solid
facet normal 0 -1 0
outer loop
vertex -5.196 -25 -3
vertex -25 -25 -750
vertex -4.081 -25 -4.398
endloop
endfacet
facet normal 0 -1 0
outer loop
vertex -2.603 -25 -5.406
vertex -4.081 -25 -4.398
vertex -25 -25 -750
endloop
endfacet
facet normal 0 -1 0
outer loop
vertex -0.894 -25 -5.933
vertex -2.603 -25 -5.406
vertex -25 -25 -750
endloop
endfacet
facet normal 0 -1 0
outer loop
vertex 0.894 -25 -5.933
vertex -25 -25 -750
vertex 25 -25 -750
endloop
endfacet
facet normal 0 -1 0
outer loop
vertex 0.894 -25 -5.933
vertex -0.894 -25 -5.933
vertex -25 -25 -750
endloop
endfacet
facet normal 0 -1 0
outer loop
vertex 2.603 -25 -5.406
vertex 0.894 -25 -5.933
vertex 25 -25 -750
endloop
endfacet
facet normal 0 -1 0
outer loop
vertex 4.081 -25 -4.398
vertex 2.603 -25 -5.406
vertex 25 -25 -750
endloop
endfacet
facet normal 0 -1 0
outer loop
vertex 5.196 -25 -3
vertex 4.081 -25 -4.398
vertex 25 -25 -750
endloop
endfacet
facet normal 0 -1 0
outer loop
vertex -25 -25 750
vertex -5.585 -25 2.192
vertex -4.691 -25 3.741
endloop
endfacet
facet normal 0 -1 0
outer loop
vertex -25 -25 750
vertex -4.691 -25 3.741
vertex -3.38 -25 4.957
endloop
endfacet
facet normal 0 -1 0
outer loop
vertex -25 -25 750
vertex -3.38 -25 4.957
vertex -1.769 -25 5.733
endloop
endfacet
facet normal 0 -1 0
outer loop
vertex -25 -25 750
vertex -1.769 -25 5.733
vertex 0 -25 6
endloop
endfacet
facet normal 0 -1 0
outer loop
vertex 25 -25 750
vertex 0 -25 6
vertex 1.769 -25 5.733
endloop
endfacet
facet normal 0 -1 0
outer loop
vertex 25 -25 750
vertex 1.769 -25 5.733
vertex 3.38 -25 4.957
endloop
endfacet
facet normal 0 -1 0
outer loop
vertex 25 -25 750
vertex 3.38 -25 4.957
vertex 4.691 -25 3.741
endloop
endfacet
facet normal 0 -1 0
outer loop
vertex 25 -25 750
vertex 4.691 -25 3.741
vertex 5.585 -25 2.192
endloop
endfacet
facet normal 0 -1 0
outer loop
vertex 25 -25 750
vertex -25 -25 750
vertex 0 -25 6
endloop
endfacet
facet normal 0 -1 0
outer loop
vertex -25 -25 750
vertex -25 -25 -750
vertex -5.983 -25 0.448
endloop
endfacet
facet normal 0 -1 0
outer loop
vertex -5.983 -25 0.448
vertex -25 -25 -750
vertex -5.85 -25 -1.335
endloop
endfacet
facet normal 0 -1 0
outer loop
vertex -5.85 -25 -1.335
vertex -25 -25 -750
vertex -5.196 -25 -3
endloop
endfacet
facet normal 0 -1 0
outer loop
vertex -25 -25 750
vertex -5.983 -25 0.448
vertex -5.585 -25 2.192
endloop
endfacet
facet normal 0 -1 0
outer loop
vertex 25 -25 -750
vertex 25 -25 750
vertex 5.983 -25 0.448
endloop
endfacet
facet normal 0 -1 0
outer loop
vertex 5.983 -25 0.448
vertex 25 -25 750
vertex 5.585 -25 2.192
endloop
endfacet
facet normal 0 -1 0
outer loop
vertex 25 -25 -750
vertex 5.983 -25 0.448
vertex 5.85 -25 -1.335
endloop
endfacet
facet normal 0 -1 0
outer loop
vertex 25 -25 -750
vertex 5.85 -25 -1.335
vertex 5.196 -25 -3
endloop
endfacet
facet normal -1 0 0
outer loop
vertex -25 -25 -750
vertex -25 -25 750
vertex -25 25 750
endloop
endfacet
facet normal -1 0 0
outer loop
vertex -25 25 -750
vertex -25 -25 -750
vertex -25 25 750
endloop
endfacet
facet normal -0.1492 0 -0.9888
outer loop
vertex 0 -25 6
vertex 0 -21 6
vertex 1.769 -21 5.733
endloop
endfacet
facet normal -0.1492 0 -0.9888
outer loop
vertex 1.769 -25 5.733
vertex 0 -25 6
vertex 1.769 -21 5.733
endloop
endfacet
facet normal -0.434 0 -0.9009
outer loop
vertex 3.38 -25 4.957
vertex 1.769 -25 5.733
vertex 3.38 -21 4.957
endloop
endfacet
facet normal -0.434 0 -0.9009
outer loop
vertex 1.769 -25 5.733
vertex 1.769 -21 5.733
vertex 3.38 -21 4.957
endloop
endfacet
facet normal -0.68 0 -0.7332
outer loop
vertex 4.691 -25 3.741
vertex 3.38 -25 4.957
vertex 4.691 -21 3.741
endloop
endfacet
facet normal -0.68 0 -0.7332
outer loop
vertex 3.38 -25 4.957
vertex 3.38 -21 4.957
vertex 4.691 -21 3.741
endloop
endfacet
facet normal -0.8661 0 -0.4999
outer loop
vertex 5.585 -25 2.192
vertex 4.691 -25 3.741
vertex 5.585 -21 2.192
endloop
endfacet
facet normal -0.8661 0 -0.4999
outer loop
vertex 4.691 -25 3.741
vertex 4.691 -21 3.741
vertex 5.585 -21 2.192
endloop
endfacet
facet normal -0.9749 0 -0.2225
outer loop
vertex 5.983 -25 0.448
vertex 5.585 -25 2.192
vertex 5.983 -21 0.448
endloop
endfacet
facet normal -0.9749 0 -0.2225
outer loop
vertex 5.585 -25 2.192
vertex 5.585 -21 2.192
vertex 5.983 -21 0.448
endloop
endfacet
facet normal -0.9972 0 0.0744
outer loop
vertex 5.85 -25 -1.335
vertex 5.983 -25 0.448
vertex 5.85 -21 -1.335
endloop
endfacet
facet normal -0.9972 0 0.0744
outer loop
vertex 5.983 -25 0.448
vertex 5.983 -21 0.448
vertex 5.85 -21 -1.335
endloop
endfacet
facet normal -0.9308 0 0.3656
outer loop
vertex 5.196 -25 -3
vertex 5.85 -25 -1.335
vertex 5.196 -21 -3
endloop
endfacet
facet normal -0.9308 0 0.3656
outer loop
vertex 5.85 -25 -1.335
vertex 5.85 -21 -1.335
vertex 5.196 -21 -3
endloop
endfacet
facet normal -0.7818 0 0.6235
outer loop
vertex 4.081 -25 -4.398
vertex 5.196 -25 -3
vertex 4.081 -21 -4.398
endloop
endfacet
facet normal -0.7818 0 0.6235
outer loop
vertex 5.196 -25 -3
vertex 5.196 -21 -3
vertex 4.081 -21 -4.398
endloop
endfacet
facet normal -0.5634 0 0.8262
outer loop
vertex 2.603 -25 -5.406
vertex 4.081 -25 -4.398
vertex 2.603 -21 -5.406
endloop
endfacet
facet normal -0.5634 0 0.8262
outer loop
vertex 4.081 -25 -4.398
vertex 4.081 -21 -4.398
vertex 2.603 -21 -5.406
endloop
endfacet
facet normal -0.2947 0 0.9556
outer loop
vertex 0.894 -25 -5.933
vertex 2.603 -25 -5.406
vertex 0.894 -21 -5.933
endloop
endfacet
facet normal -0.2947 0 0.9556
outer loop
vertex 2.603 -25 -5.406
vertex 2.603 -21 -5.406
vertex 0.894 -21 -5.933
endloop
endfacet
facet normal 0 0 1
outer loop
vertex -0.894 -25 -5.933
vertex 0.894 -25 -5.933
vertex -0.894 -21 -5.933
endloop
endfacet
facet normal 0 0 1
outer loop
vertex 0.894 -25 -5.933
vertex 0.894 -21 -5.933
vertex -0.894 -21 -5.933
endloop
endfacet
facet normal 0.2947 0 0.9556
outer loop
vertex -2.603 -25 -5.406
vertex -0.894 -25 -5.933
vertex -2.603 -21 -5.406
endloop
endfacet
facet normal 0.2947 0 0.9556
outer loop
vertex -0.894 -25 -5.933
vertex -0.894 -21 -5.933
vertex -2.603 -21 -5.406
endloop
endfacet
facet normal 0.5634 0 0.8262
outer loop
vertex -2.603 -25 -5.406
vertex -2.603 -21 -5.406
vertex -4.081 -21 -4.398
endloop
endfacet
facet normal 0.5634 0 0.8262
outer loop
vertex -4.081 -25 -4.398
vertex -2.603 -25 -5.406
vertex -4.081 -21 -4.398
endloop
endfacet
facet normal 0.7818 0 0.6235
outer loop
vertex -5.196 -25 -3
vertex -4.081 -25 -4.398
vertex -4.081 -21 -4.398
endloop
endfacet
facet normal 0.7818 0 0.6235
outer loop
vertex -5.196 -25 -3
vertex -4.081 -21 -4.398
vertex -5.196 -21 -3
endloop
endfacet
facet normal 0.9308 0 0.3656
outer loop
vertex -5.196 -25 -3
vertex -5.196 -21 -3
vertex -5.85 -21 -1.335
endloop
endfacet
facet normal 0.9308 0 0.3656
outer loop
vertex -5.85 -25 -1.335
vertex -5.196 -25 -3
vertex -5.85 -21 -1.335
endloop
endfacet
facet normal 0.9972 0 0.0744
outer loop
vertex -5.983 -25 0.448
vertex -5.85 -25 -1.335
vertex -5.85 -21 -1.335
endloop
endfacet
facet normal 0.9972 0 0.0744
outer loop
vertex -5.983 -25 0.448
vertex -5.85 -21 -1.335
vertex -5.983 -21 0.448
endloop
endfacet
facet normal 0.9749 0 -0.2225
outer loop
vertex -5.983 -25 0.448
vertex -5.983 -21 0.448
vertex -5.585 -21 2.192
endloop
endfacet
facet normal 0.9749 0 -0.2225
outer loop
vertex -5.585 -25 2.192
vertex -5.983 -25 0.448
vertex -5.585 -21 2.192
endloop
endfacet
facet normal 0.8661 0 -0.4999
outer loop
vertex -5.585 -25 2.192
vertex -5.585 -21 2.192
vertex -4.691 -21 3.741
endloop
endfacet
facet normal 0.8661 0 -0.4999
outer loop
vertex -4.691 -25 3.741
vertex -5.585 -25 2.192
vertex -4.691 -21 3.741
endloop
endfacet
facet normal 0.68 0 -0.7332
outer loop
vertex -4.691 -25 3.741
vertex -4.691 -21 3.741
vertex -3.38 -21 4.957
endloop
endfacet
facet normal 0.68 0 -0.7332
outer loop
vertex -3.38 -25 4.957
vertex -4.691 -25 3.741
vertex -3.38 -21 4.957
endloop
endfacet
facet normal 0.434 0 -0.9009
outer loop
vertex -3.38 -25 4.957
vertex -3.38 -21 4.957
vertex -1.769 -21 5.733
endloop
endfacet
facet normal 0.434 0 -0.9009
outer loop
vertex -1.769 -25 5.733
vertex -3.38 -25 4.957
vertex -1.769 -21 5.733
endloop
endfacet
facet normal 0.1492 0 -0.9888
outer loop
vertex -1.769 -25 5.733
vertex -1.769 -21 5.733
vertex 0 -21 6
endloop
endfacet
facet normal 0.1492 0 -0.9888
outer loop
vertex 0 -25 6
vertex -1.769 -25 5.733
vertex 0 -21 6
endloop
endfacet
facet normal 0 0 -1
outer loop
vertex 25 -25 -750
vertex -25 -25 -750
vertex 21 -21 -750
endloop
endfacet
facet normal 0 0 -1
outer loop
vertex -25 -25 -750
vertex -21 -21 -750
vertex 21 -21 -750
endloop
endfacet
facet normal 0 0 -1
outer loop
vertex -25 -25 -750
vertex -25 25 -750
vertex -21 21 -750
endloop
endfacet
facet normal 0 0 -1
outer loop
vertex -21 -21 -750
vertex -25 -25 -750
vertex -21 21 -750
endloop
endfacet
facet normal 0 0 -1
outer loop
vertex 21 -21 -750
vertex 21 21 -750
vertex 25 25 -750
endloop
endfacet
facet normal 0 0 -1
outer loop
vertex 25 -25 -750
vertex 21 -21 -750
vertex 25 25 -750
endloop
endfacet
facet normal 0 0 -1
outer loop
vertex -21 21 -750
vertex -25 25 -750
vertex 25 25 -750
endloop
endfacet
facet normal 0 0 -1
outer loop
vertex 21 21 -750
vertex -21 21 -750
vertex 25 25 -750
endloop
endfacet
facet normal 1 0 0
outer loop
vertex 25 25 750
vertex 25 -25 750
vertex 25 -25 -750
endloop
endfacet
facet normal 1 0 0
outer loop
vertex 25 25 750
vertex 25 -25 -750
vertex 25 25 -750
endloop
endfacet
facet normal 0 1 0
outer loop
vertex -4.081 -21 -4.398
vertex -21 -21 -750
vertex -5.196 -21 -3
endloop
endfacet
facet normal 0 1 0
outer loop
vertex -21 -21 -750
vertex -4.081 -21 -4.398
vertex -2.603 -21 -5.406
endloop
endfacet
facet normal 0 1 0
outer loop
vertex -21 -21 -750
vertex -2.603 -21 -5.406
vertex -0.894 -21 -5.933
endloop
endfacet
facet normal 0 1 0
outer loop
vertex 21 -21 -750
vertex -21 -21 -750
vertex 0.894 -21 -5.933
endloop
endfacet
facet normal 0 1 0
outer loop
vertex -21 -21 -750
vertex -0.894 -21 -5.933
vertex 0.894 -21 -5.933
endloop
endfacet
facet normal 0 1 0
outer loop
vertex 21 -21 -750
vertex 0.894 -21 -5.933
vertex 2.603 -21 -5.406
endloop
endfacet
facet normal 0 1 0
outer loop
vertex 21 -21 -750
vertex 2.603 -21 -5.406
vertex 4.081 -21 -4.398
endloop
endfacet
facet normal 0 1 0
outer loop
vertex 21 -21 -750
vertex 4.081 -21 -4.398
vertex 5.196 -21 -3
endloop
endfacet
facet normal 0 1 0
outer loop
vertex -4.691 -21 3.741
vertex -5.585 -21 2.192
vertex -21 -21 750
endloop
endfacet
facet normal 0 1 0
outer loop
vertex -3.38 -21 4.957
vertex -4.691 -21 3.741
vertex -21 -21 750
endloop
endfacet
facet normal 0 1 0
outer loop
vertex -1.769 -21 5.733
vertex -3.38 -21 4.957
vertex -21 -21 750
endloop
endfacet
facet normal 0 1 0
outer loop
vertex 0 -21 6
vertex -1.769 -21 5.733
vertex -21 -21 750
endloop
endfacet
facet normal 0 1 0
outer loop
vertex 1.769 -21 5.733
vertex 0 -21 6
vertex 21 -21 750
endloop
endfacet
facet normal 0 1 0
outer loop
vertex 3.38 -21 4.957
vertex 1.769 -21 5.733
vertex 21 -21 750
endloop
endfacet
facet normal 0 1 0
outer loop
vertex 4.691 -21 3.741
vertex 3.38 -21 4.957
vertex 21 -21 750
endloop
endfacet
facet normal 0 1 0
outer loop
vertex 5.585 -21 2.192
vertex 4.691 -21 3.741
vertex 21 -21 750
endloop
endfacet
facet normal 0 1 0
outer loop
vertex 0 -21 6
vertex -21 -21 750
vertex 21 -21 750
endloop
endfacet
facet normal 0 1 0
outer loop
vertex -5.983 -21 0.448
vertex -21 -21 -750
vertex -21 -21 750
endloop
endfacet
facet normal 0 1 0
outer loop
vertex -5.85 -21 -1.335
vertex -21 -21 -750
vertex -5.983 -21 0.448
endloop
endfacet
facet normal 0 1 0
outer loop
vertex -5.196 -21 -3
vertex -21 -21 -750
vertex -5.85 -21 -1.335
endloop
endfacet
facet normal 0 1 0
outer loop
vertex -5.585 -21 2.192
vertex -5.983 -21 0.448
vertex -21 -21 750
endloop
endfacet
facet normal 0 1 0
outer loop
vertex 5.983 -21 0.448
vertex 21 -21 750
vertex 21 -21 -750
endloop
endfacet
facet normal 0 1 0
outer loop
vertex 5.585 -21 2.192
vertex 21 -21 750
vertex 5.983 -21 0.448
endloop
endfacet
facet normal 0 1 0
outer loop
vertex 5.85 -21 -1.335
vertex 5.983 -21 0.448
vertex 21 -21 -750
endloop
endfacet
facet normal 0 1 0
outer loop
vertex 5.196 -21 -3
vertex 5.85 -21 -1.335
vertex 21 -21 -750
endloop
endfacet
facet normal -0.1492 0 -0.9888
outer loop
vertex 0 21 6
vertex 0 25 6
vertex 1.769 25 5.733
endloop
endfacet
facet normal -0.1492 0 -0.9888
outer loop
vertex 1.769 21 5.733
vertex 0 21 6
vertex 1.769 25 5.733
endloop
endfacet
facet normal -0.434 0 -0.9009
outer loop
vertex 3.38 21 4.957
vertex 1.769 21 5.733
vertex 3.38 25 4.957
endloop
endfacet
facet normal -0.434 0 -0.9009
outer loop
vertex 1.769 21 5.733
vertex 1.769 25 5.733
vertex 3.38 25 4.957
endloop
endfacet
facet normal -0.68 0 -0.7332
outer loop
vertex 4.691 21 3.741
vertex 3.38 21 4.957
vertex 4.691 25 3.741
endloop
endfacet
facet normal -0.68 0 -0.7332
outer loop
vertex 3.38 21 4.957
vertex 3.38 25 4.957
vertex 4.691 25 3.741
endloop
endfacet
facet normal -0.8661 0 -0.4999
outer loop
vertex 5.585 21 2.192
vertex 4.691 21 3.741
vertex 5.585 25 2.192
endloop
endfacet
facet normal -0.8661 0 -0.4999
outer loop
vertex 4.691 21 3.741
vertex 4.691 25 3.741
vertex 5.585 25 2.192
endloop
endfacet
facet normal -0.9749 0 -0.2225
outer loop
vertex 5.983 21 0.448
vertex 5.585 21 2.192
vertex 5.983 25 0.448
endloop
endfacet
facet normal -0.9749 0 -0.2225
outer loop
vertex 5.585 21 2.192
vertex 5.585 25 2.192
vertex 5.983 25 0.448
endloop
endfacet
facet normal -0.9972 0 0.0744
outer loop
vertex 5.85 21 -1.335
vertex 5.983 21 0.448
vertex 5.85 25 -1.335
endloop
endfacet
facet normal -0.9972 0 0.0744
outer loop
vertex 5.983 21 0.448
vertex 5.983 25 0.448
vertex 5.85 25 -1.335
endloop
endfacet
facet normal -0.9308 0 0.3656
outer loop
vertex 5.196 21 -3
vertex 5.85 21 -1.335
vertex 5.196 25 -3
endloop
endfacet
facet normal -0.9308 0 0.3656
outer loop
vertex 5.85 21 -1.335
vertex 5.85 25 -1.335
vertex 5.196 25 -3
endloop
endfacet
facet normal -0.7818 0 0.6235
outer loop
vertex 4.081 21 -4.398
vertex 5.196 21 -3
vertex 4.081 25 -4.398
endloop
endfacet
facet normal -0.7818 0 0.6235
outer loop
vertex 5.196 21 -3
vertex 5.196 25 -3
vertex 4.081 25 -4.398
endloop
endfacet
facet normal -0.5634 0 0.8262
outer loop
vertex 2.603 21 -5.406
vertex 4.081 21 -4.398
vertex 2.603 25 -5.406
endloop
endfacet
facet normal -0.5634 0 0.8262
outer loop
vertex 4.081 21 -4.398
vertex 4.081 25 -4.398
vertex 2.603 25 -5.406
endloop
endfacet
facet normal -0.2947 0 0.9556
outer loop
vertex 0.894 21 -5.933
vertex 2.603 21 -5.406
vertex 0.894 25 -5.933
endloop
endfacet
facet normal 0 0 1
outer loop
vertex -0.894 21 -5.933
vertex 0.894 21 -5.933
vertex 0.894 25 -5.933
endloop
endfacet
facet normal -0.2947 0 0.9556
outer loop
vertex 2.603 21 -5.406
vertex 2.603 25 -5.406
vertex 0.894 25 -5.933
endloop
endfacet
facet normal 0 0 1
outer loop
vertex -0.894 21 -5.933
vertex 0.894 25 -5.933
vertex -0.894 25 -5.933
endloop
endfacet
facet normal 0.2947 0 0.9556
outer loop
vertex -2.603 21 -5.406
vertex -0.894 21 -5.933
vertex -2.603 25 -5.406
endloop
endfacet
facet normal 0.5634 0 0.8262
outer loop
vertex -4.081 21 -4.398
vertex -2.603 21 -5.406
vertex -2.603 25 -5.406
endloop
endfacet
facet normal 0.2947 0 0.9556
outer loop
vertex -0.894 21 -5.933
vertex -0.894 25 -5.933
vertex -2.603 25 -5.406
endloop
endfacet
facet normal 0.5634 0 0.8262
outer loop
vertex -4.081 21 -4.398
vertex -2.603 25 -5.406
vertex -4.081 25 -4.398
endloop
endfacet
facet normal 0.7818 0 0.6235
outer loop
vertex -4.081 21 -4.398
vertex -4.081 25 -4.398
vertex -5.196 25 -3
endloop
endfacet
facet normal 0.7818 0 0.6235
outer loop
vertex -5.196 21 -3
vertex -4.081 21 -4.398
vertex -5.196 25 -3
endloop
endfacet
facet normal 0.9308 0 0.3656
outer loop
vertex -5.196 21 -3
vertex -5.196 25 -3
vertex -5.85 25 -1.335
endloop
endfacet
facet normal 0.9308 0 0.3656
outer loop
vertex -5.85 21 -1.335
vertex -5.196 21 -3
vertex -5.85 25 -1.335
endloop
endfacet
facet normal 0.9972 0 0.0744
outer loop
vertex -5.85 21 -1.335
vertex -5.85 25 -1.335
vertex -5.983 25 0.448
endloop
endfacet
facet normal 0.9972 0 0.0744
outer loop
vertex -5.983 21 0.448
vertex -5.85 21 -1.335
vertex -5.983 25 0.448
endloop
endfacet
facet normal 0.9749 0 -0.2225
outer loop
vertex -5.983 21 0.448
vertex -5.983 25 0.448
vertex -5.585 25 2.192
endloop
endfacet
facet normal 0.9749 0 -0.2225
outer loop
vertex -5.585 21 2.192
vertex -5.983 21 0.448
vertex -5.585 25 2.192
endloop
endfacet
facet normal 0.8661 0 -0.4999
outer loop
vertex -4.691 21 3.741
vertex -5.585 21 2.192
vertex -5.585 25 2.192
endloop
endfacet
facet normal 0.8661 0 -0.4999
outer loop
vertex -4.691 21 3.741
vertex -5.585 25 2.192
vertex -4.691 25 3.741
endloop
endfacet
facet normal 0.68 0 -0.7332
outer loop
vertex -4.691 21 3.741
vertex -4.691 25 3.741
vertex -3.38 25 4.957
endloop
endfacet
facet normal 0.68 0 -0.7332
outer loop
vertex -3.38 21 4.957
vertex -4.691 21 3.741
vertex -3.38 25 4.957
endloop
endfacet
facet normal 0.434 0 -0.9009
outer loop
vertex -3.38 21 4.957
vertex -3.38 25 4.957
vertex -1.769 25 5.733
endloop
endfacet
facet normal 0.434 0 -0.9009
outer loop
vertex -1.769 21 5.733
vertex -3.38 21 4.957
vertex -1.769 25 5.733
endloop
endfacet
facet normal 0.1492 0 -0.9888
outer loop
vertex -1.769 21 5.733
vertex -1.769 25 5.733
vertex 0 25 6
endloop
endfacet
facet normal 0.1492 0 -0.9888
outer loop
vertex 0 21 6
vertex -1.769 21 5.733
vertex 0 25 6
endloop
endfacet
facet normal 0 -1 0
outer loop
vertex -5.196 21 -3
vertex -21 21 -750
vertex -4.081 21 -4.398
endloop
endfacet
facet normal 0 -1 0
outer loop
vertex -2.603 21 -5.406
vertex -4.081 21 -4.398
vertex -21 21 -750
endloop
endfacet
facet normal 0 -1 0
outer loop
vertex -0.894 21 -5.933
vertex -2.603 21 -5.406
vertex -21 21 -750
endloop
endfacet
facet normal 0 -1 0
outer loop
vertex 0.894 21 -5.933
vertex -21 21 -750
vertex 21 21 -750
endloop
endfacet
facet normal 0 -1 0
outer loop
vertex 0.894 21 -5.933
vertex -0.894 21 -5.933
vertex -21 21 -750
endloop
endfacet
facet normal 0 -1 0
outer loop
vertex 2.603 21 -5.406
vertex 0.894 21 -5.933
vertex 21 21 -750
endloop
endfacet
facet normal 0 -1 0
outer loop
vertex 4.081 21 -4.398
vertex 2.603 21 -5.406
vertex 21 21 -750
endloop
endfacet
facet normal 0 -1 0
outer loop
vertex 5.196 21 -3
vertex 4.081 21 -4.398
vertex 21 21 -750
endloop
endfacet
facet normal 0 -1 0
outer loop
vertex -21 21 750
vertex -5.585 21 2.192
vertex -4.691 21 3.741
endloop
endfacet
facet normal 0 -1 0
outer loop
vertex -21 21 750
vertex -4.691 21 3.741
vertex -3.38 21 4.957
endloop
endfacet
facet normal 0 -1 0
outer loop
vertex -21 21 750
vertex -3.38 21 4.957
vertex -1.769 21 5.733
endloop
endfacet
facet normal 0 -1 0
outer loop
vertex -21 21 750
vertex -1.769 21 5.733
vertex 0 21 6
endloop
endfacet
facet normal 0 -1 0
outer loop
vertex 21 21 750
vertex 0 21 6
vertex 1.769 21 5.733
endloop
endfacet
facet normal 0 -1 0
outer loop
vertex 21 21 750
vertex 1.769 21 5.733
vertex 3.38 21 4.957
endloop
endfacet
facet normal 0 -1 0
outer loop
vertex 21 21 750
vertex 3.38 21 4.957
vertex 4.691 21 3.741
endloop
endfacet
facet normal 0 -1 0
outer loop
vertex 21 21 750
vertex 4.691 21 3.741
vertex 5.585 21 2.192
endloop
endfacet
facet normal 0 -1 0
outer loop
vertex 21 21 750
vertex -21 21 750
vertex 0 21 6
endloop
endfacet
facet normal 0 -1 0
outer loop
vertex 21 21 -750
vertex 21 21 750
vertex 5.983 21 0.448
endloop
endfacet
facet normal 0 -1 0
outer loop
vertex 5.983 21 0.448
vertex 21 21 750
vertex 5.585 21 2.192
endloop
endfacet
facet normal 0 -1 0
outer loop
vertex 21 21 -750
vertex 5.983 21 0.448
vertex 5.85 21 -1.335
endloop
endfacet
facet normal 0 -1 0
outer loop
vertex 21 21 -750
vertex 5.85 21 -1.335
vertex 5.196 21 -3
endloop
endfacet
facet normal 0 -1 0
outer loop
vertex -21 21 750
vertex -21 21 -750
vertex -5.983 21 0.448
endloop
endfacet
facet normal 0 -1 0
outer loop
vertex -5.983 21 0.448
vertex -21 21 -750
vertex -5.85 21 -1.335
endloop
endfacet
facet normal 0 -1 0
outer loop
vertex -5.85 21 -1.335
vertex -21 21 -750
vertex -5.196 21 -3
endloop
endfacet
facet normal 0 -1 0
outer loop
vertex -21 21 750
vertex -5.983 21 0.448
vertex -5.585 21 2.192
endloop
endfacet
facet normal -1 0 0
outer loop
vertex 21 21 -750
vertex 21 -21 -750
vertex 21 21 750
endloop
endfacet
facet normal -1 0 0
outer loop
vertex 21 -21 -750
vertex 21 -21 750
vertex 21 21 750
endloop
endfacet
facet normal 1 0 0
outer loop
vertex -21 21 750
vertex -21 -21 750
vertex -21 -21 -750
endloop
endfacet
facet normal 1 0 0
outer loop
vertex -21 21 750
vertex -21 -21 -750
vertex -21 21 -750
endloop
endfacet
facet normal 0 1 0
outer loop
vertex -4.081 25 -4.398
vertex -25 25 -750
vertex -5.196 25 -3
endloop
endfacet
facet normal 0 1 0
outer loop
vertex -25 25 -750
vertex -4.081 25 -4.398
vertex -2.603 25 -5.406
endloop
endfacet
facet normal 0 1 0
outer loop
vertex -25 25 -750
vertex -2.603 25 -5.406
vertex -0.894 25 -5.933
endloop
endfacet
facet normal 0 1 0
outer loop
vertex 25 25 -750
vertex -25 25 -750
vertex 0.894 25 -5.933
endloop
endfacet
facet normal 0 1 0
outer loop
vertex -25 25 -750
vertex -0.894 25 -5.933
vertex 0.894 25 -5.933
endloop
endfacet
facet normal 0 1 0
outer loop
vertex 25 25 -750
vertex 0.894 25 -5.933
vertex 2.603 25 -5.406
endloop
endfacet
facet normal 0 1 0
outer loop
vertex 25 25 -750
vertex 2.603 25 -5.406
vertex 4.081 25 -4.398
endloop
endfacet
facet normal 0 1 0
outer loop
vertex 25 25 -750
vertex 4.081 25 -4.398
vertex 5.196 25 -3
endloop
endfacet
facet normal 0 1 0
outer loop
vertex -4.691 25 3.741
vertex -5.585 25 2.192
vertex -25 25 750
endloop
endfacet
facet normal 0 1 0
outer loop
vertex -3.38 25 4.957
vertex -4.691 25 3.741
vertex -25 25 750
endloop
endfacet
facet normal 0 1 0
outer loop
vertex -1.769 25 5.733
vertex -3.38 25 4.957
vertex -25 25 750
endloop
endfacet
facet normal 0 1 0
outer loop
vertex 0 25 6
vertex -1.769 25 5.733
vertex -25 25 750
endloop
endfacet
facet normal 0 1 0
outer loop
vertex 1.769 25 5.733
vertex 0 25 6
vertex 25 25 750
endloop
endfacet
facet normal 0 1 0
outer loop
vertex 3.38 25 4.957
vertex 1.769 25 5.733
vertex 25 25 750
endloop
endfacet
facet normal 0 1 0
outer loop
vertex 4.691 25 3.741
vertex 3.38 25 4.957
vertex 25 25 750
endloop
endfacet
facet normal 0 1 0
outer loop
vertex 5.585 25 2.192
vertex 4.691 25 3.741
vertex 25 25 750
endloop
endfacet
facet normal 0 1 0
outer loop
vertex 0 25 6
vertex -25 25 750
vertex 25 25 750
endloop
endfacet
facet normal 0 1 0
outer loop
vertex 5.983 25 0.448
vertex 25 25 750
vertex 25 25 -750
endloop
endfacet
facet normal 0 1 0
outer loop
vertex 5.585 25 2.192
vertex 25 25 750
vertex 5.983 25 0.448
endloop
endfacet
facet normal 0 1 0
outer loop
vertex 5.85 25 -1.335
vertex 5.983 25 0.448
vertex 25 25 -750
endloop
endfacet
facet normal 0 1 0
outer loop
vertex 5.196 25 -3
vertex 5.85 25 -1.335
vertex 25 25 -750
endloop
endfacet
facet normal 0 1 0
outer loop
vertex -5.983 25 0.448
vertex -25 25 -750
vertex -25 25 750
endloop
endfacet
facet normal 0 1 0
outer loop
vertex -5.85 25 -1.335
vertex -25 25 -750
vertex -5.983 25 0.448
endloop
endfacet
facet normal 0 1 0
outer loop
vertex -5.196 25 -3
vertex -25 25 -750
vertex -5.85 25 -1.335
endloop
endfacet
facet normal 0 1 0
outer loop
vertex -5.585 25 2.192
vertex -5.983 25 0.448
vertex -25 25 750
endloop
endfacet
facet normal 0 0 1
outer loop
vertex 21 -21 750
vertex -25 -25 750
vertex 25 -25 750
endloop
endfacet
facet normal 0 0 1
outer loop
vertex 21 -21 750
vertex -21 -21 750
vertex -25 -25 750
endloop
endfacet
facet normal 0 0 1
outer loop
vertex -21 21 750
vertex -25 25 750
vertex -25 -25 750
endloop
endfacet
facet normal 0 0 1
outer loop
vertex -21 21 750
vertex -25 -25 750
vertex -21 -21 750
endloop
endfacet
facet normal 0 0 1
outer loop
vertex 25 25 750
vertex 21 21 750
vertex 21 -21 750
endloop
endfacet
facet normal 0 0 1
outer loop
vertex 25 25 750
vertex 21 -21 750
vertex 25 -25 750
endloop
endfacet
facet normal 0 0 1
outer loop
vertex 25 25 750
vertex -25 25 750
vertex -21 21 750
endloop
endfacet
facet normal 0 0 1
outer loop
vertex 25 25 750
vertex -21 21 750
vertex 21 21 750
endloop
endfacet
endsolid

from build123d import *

# Parameters (mm, degrees)
SKETCH_1_W          = 50
SKETCH_1_H          = 50
SKETCH_1_W_2        = 42
SKETCH_1_H_2        = 42
EXTRUDE_1_DEPTH     = 750
SKETCH_2_R          = 6
CUT_EXTRUDE_1_DEPTH = 753.080447825


with BuildPart() as part:
    # 草图1 → 凸台-拉伸1 (new, symmetric)
    with BuildSketch(Plane.XY):
        Rectangle(SKETCH_1_W, SKETCH_1_H)
        Rectangle(SKETCH_1_W_2, SKETCH_1_H_2, mode=Mode.SUBTRACT)
    extrude(amount=EXTRUDE_1_DEPTH, both=True)

    # 草图2 → 切除-拉伸1 (cut, through all)
    with BuildSketch(Plane(origin=(0, 25, 0), x_dir=(1, 0, 0), z_dir=(0, 1, 0))):
        with Locations(Location((0, 0, 0), (0, 0, 270))):
            Circle(SKETCH_2_R)
    extrude(amount=-CUT_EXTRUDE_1_DEPTH, mode=Mode.SUBTRACT)


solid = part.part
